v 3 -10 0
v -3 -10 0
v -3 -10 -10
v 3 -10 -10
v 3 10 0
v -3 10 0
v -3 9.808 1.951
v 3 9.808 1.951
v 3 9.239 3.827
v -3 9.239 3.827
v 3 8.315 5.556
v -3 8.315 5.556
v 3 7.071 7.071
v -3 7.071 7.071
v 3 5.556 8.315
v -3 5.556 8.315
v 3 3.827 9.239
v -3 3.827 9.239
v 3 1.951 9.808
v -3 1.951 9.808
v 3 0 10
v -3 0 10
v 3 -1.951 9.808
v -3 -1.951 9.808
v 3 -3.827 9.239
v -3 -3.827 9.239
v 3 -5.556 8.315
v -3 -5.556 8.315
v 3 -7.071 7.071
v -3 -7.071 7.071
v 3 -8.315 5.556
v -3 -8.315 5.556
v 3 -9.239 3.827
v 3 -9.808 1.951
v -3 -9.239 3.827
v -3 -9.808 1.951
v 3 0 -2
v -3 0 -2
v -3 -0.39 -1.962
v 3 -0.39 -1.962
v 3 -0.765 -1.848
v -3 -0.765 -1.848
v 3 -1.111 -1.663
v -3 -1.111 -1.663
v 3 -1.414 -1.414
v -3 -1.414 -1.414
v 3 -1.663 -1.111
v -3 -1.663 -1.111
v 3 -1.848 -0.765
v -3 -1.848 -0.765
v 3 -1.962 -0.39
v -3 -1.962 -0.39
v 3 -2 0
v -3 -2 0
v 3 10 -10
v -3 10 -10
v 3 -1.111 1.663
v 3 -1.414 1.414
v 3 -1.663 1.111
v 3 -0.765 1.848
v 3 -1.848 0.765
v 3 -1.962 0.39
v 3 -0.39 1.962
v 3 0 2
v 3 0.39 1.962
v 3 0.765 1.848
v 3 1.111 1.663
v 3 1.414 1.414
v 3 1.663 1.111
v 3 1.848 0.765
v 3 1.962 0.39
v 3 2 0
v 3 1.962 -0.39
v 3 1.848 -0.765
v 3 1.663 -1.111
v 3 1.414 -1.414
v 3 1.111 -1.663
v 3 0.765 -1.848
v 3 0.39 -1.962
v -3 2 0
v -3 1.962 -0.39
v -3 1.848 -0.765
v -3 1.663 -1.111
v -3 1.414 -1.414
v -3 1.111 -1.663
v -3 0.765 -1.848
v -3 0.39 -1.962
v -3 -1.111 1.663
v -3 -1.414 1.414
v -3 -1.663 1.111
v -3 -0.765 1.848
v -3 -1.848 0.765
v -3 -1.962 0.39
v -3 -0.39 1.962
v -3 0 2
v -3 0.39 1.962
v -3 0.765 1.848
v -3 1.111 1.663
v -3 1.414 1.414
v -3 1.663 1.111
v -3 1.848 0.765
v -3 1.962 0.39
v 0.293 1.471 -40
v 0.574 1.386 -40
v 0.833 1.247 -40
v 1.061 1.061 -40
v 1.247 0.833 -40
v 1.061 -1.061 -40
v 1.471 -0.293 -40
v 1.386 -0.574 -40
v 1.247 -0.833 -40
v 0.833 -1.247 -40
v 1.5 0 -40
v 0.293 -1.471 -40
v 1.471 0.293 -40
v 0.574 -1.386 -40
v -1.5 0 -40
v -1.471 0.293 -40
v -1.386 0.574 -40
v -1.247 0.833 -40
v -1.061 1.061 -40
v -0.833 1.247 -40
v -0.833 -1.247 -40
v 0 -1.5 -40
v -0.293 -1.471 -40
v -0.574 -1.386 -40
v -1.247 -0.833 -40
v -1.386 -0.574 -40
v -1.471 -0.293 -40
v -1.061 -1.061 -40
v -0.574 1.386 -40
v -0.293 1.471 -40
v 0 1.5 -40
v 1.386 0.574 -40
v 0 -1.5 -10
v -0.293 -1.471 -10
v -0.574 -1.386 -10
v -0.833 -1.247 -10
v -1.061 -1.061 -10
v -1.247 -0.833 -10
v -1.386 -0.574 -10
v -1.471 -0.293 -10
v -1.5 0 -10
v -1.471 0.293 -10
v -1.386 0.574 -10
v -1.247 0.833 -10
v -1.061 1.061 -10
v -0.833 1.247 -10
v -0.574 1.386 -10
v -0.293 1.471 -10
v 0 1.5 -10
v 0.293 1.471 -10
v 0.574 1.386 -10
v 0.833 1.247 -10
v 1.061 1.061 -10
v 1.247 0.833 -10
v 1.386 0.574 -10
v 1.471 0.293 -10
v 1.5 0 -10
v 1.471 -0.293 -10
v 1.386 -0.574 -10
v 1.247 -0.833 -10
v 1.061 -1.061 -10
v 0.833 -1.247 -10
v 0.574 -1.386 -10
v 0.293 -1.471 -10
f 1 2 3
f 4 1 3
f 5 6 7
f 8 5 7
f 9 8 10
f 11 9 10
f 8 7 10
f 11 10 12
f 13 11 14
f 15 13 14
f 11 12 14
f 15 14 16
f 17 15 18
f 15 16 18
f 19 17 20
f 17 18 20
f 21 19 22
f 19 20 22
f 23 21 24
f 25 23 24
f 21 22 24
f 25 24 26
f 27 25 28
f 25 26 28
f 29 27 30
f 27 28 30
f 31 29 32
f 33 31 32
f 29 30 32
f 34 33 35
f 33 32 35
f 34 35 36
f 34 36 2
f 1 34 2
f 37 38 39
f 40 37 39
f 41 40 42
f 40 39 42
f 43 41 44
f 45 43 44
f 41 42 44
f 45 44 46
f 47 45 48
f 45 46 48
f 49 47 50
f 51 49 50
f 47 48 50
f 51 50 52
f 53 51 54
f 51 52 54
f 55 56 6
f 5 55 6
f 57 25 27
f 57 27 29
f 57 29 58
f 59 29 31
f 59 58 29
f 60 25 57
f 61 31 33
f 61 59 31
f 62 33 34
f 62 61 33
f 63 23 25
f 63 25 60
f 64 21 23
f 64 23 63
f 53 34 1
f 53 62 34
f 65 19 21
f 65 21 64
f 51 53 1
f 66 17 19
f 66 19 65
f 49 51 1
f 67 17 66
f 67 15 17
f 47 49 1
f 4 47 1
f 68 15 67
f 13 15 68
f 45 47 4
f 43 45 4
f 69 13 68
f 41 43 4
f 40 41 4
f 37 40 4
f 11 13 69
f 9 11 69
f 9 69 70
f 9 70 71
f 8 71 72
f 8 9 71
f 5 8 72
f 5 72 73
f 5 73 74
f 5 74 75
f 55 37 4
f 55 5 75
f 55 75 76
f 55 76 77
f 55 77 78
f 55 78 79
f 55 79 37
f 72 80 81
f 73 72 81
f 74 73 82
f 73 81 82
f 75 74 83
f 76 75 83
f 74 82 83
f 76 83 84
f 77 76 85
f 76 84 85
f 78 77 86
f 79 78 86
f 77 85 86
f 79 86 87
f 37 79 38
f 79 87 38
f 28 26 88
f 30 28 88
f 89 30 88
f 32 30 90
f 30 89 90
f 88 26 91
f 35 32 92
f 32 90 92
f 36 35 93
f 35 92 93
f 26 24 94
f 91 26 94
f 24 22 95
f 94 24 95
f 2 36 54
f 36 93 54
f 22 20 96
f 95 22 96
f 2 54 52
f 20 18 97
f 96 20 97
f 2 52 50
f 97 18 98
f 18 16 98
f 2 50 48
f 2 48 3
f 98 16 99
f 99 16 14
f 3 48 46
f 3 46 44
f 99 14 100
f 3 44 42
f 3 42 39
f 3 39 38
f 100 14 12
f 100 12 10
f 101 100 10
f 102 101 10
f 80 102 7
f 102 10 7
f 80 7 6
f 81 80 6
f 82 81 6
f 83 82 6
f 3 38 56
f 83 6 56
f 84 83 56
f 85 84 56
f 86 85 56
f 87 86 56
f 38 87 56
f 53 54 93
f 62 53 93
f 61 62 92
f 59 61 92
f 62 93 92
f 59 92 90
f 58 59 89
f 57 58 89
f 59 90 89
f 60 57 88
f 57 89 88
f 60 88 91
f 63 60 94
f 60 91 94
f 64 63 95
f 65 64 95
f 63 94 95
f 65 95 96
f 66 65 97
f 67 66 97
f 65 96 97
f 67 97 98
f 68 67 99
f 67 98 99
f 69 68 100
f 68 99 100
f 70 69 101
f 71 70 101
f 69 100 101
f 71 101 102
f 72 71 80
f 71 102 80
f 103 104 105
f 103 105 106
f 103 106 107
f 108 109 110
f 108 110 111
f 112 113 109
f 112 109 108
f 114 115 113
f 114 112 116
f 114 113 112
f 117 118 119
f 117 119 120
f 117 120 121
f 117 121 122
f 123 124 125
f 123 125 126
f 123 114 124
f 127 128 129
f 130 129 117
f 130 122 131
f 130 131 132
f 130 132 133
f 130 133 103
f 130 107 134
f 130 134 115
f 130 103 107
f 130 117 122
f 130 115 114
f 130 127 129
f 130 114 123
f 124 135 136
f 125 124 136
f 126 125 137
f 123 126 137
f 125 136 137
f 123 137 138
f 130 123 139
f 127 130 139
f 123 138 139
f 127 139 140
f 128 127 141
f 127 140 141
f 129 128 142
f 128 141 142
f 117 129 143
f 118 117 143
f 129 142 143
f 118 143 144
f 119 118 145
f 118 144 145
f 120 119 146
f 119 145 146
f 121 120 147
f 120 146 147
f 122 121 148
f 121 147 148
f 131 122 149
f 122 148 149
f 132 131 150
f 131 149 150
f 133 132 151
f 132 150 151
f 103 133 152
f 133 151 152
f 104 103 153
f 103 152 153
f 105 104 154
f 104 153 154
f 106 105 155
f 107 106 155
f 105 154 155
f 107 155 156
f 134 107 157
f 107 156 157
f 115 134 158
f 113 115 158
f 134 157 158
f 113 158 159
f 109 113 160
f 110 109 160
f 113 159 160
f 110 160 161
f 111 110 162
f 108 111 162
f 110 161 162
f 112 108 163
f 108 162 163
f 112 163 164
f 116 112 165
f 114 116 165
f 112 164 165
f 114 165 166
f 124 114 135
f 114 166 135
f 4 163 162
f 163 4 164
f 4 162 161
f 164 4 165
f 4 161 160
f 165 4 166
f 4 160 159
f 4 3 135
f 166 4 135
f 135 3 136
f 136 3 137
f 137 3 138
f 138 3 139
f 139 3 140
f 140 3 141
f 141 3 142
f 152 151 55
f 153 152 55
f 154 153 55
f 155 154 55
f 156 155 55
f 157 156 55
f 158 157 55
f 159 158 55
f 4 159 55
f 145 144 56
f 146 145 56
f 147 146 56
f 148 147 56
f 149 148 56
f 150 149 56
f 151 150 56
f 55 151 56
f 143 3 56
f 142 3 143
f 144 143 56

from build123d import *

# Parameters (mm, degrees)
EXTRUDE_2_DEPTH      = 3
EXTRUDE_2_DEPTH_BACK = 3
SKETCH_1_R           = 2
SKETCH_2_R           = 1.5
EXTRUDE_3_DEPTH      = 30


with BuildPart() as part:
    # 草图1 → 凸台-拉伸2 (new, two sides: drawn at the far end of the back side and taken through both)
    with BuildSketch(Plane(origin=(0, 0, 0), x_dir=(0, 0, -1), z_dir=(1, 0, 0)).offset(-EXTRUDE_2_DEPTH_BACK)):
        with BuildLine():
            Line((10, 10), (0, 10))
            ThreePointArc((0, 10), (-10, 0), (0, -10))
            Line((0, -10), (10, -10))
            Line((10, -10), (10, 10))
        make_face()
        Circle(SKETCH_1_R, mode=Mode.SUBTRACT)
    extrude(amount=EXTRUDE_2_DEPTH + EXTRUDE_2_DEPTH_BACK)

    # 草图2 → 凸台-拉伸3 (add)
    with BuildSketch(Plane(origin=(0, 0, -10), x_dir=(-1, 0, 0), z_dir=(0, 0, -1))):
        Circle(SKETCH_2_R)
    extrude(amount=EXTRUDE_3_DEPTH)


solid = part.part
